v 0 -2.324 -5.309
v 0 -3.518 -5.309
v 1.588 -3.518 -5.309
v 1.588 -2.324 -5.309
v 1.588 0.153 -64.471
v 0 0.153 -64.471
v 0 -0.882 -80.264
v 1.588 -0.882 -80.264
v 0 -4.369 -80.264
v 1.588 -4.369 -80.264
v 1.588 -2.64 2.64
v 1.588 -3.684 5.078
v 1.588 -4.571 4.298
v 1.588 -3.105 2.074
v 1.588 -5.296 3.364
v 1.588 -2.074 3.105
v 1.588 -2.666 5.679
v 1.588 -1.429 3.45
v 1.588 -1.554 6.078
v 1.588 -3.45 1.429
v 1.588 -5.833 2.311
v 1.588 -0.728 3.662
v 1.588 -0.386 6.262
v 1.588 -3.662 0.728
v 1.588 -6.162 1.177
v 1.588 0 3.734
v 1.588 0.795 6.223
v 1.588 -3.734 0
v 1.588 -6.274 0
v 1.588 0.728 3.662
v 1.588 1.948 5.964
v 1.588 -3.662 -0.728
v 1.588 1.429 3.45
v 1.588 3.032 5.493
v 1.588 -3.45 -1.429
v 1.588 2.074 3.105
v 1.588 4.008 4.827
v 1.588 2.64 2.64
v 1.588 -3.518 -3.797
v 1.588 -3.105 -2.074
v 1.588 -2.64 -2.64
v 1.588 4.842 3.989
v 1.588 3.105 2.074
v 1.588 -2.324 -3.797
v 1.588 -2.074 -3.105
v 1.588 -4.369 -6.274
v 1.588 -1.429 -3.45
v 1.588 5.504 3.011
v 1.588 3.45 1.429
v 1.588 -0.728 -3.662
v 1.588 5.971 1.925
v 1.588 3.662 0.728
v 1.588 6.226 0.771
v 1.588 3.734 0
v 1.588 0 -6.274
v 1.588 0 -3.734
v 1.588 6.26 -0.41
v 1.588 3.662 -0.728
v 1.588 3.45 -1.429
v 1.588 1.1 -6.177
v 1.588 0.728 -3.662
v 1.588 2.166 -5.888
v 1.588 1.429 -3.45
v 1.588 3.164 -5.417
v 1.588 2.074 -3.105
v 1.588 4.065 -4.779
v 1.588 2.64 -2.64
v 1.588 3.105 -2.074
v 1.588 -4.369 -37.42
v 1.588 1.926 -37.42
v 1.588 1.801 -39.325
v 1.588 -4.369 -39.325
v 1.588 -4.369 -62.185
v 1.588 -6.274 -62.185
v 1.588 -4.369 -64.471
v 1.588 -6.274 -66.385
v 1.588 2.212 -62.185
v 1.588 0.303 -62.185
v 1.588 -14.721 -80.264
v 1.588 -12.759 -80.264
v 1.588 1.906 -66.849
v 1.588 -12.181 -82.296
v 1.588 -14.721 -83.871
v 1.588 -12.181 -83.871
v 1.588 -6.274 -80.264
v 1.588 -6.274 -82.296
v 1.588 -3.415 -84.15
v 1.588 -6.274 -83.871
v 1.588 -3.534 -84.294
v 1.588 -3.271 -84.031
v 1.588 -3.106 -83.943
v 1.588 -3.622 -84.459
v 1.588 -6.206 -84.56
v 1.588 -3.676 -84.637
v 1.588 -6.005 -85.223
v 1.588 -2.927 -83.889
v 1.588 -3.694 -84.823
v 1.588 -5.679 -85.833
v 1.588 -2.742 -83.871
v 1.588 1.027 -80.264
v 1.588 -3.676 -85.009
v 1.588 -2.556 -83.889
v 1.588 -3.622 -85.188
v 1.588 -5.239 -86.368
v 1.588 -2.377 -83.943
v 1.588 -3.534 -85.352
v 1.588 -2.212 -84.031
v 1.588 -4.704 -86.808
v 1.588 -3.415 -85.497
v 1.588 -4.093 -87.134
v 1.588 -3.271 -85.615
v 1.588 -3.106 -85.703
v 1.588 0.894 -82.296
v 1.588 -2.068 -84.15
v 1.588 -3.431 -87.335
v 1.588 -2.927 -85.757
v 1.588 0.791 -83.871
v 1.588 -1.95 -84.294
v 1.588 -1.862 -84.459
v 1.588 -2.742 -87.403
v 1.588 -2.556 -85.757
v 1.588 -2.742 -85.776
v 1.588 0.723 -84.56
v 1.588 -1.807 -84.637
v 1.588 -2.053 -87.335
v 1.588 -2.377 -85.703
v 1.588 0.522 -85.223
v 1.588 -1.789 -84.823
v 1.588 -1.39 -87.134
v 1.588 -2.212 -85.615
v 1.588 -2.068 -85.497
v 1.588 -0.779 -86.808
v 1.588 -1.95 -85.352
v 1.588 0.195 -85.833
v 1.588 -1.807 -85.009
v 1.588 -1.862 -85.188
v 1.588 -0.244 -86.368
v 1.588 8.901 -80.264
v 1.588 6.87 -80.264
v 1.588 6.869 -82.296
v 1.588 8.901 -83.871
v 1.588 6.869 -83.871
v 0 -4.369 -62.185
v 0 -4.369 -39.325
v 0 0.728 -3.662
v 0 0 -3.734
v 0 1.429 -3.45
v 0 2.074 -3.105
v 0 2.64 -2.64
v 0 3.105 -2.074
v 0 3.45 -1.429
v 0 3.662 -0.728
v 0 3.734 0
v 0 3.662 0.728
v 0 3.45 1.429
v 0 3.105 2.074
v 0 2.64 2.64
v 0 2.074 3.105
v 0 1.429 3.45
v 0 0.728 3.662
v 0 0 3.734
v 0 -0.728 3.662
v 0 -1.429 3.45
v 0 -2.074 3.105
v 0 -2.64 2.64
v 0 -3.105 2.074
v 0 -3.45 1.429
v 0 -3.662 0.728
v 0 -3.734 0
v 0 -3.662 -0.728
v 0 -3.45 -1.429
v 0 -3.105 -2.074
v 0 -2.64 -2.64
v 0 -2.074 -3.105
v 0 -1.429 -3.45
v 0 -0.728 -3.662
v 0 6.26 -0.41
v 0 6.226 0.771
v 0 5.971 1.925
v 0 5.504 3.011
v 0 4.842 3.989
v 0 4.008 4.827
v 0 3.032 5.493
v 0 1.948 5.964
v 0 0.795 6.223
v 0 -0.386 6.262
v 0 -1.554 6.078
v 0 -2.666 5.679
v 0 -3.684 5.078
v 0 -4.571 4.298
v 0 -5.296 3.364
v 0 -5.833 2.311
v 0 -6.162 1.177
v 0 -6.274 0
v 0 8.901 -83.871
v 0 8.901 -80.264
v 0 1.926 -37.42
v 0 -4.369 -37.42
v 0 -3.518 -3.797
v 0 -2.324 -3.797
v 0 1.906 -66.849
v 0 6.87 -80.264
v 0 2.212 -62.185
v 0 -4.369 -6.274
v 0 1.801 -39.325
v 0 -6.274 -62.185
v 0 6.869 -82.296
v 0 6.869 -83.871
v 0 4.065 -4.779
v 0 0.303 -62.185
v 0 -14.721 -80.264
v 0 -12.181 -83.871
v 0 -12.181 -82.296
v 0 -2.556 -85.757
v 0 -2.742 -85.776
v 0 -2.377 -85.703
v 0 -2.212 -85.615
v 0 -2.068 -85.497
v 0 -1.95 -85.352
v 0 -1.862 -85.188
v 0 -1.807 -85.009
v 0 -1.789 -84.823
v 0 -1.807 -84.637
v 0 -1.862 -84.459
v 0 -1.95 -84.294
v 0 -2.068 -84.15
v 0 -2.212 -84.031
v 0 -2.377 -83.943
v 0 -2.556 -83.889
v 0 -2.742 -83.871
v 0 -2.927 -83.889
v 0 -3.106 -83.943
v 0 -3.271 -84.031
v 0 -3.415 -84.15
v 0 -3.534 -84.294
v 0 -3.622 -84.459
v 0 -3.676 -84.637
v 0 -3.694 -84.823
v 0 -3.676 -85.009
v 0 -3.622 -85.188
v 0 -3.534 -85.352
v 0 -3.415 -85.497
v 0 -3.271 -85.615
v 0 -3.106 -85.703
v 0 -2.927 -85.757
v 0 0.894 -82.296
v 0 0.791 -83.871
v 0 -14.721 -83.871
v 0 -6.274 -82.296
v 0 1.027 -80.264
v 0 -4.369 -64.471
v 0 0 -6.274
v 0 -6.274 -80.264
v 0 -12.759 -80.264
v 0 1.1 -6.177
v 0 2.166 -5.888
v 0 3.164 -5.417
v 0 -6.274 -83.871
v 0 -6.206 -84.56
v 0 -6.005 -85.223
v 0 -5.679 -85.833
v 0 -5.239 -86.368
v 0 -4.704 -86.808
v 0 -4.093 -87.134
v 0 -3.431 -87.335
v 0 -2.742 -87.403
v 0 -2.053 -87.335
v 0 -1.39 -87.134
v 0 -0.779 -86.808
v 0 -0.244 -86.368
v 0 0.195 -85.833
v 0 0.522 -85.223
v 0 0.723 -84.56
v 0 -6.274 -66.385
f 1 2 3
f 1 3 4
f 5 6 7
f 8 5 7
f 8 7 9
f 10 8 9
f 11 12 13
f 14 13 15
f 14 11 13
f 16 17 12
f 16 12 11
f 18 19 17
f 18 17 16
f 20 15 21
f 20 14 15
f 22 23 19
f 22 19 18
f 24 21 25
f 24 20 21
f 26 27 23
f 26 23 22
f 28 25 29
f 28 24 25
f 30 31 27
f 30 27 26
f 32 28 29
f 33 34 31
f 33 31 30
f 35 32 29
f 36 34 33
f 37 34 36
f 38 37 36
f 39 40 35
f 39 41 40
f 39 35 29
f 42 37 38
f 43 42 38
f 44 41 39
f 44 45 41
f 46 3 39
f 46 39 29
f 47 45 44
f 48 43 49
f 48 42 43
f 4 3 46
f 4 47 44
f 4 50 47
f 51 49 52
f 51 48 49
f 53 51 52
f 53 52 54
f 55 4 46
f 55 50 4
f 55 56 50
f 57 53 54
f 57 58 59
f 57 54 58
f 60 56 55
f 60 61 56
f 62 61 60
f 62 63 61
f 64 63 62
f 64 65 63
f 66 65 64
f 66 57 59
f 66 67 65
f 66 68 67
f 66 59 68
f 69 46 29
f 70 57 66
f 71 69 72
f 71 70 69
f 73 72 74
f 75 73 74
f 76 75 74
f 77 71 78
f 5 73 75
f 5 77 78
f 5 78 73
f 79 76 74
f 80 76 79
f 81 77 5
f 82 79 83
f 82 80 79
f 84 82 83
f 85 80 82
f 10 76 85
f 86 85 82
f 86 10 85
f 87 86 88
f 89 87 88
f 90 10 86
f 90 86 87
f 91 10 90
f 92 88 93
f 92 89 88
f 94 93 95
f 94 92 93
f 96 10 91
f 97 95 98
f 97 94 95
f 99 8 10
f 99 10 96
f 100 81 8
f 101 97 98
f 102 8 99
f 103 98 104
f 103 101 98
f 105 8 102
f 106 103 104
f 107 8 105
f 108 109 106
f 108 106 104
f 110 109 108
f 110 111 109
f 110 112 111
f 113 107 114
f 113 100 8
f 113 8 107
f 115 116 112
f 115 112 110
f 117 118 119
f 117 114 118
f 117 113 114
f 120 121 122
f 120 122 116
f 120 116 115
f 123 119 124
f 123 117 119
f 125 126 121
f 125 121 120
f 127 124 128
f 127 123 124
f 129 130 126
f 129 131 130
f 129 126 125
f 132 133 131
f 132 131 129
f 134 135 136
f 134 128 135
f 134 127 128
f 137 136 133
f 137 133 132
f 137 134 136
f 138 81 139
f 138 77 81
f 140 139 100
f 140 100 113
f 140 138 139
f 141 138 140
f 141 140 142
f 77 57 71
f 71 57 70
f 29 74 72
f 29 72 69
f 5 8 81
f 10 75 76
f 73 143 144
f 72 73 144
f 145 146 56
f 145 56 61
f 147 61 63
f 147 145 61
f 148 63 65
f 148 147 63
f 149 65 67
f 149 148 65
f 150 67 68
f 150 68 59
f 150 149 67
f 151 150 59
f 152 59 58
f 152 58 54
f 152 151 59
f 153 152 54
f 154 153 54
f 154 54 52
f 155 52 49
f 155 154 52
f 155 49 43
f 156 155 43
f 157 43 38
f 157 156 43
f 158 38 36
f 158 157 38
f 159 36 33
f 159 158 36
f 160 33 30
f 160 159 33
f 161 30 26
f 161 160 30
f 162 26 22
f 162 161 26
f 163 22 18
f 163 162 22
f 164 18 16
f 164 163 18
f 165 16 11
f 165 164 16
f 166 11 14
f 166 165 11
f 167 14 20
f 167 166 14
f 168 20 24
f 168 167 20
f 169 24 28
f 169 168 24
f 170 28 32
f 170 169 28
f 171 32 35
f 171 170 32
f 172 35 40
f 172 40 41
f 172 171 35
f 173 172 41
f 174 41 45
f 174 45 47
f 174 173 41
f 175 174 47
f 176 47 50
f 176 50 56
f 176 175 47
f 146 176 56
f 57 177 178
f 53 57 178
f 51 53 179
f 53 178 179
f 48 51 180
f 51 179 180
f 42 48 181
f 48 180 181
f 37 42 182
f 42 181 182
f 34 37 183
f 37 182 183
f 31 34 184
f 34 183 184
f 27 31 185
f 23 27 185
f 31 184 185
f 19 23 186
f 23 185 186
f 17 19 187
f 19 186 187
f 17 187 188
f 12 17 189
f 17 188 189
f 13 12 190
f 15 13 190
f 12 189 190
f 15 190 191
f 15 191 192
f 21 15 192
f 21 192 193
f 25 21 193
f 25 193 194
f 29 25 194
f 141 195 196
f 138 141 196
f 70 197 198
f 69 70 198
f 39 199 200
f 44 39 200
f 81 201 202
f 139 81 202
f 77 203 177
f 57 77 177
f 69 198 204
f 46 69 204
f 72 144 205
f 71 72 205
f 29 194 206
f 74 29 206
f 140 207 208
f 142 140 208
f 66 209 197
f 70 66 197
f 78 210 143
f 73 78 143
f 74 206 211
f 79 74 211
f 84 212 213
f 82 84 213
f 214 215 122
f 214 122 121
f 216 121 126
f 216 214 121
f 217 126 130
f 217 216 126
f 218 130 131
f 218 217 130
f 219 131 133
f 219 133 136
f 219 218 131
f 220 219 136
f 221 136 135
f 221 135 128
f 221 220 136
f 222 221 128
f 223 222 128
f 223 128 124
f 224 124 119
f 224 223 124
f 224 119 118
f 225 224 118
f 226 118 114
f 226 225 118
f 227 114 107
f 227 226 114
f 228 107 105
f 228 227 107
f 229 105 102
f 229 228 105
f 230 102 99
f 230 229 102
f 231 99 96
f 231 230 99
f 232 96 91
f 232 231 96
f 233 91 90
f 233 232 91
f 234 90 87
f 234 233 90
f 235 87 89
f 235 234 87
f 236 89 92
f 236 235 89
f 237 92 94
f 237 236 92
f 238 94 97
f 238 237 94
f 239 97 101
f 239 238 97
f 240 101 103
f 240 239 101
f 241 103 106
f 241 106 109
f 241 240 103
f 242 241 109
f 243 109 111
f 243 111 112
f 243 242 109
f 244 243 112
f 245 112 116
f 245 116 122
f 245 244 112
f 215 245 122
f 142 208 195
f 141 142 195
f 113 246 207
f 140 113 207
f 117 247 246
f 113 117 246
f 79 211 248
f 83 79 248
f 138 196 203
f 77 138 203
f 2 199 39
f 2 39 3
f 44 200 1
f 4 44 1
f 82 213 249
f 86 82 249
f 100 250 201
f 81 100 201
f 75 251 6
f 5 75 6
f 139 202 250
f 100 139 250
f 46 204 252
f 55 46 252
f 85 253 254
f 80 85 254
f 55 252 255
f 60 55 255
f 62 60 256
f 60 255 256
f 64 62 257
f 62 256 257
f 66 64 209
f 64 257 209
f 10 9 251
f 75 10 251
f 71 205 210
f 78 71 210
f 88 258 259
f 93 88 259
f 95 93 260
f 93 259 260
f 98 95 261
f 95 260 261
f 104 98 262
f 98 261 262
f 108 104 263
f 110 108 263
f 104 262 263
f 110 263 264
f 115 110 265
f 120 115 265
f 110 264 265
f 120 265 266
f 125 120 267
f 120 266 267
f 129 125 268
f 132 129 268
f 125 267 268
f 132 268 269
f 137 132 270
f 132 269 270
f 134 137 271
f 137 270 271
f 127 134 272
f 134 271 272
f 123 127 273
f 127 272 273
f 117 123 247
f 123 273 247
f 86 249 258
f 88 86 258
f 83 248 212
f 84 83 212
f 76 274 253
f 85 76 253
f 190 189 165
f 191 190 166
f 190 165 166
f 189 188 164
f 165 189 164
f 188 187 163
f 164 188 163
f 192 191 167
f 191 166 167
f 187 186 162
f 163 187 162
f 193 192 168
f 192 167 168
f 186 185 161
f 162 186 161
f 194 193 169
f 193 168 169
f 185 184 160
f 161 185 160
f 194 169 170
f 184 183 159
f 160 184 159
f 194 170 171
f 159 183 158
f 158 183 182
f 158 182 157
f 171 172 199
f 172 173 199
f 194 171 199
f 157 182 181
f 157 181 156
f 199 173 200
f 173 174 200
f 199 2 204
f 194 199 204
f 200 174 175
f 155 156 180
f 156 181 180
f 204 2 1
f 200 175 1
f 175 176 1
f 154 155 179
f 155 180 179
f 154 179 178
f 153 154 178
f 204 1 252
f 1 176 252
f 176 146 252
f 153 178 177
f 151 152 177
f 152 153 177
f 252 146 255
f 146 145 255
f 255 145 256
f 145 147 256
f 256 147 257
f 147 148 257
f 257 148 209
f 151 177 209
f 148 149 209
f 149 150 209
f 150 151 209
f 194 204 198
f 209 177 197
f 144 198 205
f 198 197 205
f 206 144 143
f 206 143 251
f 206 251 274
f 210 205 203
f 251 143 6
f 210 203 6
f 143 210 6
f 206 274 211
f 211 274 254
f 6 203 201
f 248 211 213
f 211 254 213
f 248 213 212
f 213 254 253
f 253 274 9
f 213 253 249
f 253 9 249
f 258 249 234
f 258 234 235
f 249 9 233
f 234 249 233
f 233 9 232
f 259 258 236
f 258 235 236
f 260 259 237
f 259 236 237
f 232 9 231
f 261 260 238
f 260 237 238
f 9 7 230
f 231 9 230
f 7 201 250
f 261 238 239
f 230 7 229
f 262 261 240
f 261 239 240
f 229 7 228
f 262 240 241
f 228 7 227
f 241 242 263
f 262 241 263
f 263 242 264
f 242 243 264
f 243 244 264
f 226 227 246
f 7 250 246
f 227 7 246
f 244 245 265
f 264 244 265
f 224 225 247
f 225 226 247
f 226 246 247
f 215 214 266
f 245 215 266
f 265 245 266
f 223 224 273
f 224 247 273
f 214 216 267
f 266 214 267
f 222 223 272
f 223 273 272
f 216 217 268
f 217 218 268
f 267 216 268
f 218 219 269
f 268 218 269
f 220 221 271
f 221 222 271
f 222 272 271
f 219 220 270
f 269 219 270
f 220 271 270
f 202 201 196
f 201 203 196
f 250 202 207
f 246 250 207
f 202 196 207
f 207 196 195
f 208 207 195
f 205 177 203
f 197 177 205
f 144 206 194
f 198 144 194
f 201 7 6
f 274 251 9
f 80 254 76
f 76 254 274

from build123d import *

# Parameters (mm, degrees)
SKETCH1_W           = 1.5113
SKETCH1_H           = 1.1938
SKETCH1_R           = 3.7338
SKETCH1_R_2         = 0.9525
BOSS_EXTRUDE1_DEPTH = 1.5875


with BuildPart() as part:
    # Sketch1 → Boss-Extrude1 (new body)
    with BuildSketch(Plane(origin=(0, 0, 0), x_dir=(0, 0, -1), z_dir=(1, 0, 0))):
        with BuildLine():
            Line((82.296, -12.181036366), (82.296, -6.2738))
            Line((82.296, -6.2738), (83.8708, -6.2738))
            ThreePointArc((83.8708, -6.2738), (87.402991636, -2.741608364), (83.8708, 0.790583272))
            Line((83.8708, 0.790583272), (82.296, 0.893791599))
            Line((82.296, 0.893791599), (82.296, 6.868963634))
            Line((82.296, 6.868963634), (83.8708, 6.868963634))
            Line((83.8708, 6.868963634), (83.8708, 8.900963634))
            Line((83.8708, 8.900963634), (80.264, 8.900963634))
            Line((80.264, 8.900963634), (62.185099246, 2.211808127))
            Line((62.185099246, 2.211808127), (0.410288477, 6.260369782))
            ThreePointArc((0.410288477, 6.260369782), (-6.270441547, 0.205254114), (0, -6.2738))
            Line((0, -6.2738), (62.185099246, -6.2738))
            Line((62.185099246, -6.2738), (80.264, -14.721036366))
            Line((80.264, -14.721036366), (83.8708, -14.721036366))
            Line((83.8708, -14.721036366), (83.8708, -12.181036366))
            Line((83.8708, -12.181036366), (82.296, -12.181036366))
        make_face()
        Polygon((39.325099246, 1.800906775), (62.185099246, 0.302721378), (62.185099246, -4.3688), (39.325099246, -4.3688), align=None, mode=Mode.SUBTRACT)
        Polygon((64.471099246, 0.152902838), (80.264, -0.882123115), (80.264, -4.3688), (64.471099246, -4.3688), align=None, mode=Mode.SUBTRACT)
        Polygon((66.3852906, -6.2738), (80.264, -6.2738), (80.264, -12.758527161), align=None, mode=Mode.SUBTRACT)
        with Locations((4.55295, -2.921)):
            Rectangle(SKETCH1_W, SKETCH1_H, mode=Mode.SUBTRACT)
        Circle(SKETCH1_R, mode=Mode.SUBTRACT)
        with BuildLine():
            Line((4.778751005, 4.064985273), (37.420099246, 1.925755558))
            Line((37.420099246, 1.925755558), (37.420099246, -4.3688))
            Line((37.420099246, -4.3688), (6.2738, -4.3688))
            Line((6.2738, -4.3688), (6.2738, 0))
            ThreePointArc((6.2738, 0), (5.888187094, 2.165599038), (4.778751005, 4.064985273))
        make_face(mode=Mode.SUBTRACT)
        Polygon((80.264, 1.026963634), (66.848818814, 1.906159984), (80.264, 6.869748995), align=None, mode=Mode.SUBTRACT)
        with Locations((84.8233, -2.741608364)):
            Circle(SKETCH1_R_2, mode=Mode.SUBTRACT)
    extrude(amount=BOSS_EXTRUDE1_DEPTH)


solid = part.part
